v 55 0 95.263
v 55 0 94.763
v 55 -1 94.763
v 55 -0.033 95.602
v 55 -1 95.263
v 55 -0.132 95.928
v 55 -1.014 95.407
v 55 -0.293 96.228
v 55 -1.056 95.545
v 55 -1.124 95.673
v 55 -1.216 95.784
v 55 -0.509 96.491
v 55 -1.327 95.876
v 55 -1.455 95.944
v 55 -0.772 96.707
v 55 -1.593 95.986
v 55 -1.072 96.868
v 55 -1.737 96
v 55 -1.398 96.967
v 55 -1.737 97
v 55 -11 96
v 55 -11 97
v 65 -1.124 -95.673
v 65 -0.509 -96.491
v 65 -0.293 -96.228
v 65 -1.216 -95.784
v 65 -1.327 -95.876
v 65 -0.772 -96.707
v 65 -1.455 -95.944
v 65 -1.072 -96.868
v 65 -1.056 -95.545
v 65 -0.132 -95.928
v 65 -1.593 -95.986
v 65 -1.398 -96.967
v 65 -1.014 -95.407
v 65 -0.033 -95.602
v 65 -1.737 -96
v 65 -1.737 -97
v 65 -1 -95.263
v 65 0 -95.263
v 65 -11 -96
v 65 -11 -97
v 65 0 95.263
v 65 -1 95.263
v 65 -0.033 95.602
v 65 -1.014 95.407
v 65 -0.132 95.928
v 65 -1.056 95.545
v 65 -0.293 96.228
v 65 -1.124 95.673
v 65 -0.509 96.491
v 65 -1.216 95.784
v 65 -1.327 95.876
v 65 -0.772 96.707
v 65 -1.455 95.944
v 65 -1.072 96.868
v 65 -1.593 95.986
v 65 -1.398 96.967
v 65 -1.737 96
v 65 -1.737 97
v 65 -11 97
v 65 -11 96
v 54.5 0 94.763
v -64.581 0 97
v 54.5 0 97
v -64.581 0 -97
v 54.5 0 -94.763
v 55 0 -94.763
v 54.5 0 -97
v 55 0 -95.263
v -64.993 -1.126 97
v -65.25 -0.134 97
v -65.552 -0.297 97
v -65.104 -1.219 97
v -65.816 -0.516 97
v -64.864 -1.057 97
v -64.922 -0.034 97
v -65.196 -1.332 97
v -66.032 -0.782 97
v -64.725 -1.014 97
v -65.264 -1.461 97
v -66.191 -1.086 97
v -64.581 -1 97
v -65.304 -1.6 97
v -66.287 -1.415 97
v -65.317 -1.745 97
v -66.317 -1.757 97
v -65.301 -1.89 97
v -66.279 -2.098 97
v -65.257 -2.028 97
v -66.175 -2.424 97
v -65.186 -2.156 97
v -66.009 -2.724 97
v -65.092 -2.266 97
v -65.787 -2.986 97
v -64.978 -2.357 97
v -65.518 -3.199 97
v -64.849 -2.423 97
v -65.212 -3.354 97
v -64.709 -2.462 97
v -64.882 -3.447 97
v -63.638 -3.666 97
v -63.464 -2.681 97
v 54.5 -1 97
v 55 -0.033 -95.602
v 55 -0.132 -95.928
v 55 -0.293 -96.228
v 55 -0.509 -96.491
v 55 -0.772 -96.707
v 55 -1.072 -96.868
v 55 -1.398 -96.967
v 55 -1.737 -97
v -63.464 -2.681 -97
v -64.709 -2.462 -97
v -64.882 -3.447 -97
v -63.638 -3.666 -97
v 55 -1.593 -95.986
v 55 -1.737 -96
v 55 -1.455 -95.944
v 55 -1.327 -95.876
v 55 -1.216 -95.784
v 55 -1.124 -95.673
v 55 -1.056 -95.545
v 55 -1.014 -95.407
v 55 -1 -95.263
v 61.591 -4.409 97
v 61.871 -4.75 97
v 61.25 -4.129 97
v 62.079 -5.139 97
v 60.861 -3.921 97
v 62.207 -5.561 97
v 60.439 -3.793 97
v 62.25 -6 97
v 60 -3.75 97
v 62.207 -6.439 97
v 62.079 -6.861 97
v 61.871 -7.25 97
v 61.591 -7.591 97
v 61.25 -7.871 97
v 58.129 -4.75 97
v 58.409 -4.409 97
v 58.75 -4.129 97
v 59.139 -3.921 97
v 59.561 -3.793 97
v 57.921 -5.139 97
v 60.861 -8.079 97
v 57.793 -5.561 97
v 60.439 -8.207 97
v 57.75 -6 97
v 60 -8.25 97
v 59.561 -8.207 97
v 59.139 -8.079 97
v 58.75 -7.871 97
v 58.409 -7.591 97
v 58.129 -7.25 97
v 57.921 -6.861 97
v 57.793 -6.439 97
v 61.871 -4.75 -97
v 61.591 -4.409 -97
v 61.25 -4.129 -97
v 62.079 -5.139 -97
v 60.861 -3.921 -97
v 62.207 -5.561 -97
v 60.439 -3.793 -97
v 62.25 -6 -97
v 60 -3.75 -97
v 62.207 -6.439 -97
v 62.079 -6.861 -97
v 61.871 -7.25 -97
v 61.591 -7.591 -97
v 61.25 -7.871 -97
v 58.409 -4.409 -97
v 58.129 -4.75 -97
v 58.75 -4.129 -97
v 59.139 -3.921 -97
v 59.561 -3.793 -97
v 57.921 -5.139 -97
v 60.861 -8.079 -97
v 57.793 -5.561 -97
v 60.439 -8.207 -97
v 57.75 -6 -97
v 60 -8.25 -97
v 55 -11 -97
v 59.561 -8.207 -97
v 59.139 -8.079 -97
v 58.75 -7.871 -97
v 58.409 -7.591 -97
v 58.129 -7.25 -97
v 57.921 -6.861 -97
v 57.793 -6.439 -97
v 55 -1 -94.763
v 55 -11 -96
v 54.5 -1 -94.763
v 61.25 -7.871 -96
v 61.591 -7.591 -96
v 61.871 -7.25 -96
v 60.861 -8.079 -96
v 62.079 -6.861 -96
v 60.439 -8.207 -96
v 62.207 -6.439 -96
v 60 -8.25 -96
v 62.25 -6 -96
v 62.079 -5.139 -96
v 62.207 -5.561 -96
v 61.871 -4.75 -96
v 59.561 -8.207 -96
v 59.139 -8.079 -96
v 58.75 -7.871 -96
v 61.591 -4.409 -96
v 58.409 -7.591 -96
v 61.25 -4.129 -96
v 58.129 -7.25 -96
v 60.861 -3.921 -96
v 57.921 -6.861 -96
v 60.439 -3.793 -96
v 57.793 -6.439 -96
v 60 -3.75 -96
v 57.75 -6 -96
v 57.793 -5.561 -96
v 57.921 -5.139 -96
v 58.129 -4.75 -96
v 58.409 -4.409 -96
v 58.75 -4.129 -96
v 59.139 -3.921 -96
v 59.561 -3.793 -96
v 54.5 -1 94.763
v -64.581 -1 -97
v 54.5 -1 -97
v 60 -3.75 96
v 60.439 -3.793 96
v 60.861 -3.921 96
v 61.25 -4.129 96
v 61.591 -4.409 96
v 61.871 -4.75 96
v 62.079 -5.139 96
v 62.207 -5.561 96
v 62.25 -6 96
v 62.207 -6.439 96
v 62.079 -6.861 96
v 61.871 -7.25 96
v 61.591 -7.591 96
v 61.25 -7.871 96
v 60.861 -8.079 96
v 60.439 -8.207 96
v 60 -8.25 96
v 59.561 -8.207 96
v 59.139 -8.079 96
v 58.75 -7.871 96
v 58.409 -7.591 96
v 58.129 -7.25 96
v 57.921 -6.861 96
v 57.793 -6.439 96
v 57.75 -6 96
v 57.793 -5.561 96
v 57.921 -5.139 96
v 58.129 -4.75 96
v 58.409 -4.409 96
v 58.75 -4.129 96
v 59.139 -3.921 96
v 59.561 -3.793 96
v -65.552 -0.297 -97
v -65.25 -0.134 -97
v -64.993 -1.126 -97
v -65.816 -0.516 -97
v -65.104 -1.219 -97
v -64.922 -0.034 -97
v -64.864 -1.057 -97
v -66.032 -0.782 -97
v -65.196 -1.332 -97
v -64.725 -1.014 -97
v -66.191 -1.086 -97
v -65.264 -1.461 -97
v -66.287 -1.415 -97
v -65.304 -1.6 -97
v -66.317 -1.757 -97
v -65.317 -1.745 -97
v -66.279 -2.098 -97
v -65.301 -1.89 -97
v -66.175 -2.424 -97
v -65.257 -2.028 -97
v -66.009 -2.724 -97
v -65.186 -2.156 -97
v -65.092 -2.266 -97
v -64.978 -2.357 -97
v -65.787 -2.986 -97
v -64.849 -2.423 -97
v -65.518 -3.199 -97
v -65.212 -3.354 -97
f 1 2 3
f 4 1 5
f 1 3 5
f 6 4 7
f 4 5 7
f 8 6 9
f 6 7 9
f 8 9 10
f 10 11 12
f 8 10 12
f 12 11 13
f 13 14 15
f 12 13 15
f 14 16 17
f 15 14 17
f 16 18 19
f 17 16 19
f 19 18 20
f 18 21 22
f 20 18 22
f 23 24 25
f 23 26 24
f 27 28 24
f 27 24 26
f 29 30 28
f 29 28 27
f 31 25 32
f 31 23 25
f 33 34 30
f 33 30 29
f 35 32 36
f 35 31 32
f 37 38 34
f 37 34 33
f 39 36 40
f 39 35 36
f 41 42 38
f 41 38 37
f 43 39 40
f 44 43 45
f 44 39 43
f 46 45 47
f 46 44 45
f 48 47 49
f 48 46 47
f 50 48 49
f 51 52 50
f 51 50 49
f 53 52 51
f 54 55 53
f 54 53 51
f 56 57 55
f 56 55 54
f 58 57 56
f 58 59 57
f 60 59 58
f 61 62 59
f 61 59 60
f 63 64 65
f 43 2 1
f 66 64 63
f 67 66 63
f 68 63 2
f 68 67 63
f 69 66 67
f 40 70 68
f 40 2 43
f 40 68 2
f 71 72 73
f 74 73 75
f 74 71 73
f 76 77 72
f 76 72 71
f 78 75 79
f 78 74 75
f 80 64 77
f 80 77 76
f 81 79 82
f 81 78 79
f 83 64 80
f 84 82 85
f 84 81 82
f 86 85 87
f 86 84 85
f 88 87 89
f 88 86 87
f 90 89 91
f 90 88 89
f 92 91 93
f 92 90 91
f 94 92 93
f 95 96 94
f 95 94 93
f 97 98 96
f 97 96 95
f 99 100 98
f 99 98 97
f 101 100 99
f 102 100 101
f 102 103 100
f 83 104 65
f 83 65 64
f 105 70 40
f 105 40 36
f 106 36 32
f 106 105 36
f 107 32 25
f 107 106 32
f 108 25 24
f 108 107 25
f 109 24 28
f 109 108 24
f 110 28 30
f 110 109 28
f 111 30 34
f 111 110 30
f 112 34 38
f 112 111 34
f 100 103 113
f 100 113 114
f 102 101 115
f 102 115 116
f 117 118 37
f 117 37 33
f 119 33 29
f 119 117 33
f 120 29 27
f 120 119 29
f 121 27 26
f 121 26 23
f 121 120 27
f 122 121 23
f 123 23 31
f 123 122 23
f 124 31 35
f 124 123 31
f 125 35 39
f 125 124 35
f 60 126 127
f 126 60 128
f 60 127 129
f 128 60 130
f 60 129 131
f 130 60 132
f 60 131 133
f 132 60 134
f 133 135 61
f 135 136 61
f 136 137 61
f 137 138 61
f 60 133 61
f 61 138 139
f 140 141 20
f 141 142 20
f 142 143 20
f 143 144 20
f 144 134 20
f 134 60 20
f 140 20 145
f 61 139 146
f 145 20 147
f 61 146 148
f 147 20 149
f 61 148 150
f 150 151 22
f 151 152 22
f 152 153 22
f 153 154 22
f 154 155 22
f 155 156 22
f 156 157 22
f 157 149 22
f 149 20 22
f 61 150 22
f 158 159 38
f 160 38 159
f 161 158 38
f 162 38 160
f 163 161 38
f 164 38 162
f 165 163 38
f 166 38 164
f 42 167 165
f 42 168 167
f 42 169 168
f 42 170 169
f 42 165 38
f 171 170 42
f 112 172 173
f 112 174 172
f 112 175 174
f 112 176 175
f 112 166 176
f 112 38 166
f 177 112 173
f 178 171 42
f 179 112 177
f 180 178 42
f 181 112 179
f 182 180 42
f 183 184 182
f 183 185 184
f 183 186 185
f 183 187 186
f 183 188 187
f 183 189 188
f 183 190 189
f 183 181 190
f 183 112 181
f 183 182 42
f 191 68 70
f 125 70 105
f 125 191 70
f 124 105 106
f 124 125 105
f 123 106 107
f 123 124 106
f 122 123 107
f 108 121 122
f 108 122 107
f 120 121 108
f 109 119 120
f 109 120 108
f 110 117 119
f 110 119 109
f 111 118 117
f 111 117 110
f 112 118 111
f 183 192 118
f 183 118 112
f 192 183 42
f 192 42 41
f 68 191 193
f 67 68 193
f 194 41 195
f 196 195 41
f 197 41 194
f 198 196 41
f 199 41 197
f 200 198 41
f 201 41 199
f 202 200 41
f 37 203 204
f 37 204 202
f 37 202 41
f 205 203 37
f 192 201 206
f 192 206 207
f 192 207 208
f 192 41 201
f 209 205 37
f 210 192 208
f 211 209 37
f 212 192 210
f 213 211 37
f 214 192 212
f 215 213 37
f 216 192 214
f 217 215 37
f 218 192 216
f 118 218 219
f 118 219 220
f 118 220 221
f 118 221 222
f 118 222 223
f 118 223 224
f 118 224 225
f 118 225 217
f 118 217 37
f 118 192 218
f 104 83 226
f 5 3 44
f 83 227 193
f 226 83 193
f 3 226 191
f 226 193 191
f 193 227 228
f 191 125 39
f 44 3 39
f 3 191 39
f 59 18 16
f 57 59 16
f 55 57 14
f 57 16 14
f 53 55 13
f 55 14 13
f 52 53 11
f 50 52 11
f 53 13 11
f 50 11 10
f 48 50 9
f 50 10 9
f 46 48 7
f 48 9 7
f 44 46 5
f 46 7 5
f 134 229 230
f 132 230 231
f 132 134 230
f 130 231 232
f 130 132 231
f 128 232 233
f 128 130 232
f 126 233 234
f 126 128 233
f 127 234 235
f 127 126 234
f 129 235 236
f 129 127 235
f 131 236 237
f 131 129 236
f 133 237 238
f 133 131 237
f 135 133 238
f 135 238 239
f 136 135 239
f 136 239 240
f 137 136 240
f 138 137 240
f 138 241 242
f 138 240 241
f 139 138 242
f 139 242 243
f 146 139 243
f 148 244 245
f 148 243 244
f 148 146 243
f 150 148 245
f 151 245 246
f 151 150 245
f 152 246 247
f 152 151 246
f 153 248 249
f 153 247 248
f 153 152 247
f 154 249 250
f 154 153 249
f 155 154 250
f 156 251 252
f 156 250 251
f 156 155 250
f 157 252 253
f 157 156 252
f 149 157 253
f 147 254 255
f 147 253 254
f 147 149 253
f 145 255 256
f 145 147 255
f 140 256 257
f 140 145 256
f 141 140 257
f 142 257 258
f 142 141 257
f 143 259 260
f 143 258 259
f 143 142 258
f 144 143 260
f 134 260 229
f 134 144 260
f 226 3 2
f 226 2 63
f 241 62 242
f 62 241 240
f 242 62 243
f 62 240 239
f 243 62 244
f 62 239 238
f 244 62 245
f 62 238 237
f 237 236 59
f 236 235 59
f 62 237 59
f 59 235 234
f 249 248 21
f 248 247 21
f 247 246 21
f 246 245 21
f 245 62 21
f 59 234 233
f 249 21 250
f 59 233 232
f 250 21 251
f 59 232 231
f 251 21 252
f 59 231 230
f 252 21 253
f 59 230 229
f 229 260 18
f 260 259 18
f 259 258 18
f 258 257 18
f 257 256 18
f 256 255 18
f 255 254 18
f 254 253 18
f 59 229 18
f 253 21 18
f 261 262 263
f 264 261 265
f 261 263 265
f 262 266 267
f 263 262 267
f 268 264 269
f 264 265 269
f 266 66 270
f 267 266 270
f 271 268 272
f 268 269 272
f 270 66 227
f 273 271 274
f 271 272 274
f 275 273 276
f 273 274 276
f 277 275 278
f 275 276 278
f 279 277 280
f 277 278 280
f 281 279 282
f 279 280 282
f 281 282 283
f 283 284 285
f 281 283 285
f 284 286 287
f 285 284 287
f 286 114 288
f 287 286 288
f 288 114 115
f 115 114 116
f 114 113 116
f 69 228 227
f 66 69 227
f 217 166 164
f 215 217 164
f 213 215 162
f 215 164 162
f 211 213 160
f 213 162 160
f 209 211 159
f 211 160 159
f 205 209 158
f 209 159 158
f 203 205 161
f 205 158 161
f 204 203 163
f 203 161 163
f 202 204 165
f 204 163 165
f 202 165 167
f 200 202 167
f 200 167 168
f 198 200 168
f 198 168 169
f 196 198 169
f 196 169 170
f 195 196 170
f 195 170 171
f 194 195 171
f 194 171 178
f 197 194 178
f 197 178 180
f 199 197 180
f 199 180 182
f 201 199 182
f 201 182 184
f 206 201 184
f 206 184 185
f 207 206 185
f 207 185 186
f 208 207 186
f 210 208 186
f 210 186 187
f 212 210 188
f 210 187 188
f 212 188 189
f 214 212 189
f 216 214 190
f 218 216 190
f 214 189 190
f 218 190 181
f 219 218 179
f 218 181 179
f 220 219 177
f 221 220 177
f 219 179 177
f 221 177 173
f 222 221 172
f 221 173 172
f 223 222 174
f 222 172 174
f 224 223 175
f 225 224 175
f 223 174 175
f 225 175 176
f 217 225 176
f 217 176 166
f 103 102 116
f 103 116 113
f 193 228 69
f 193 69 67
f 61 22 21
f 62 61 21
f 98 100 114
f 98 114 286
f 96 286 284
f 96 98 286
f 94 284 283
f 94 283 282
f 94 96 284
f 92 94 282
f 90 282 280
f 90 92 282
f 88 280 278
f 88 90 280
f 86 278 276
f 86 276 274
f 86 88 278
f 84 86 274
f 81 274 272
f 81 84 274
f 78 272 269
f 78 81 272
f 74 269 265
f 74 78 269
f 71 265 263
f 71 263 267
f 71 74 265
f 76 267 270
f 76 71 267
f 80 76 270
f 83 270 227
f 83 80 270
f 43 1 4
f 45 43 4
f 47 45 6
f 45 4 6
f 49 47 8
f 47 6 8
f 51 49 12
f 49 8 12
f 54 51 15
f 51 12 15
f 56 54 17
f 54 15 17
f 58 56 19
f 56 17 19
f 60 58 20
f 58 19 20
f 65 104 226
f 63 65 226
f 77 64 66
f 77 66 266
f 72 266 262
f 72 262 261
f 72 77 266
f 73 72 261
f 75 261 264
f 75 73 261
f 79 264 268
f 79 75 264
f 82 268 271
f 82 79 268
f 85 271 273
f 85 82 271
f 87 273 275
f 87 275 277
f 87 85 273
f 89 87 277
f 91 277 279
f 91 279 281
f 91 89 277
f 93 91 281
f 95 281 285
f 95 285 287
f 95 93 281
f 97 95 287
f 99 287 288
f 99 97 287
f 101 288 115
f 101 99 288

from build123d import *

# Parameters (mm, degrees)
SKETCH1_W                     = 130
SKETCH1_H                     = 194
BASE_FLANGE1_DEPTH            = 1
EDGE_FLANGE1_STRIP_CUT_DEPTH  = 194
EDGE_FLANGE1_DEPTH            = 194
EDGE_FLANGE2_STRIP_W          = 5.4732
EDGE_FLANGE2_STRIP_H          = 1
EDGE_FLANGE2_STRIP_CUT_DEPTH  = 10
EDGE_FLANGE2_RELIEF_W         = 5.9732
EDGE_FLANGE2_RELIEF_H         = 0.5
EDGE_FLANGE2_RELIEF_CUT_DEPTH = 1
EDGE_FLANGE2_DEPTH            = 10
SKETCH14_R                    = 2.25
CUT_EXTRUDE1_DEPTH            = 206.316765339


# Sheet-metal steps are written as plain solids
with BuildPart() as part:
    # Sketch1 → Base-Flange1 (new body)
    with BuildSketch(Plane(origin=(0, 0, 0), x_dir=(1, 0, 0), z_dir=(0, 1, 0))):
        Rectangle(SKETCH1_W, SKETCH1_H)
    extrude(amount=-BASE_FLANGE1_DEPTH)

    # Edge-Flange1 strip (across the edge) → Edge-Flange1 strip cut (cut)
    with BuildSketch(Plane(origin=(-73, -1, 97), x_dir=(0.17364817766693103, 0.984807753012208, 0), z_dir=(0, 0, -1))):
        Polygon((-9.805618071, -61.369193981), (2.446817144, 8.117819101), (1.462009391, 8.291467279), (-10.790425824, -61.195545803), align=None)
    extrude(amount=EDGE_FLANGE1_STRIP_CUT_DEPTH, mode=Mode.SUBTRACT)

    # Edge-Flange1 section (across the edge) → Edge-Flange1 (add)
    with BuildSketch(Plane(origin=(-73, -1, 97), x_dir=(0.17364817766693103, 0.984807753012208, 0), z_dir=(0, 0, -1))):
        with BuildLine():
            Line((-1, 8.419376526), (-1, 9.682776526))
            Line((-1, 9.682776526), (0, 9.682776526))
            Line((0, 9.682776526), (0, 8.419376526))
            ThreePointArc((0, 8.419376526), (0.67240108, 7.685579512), (1.462009391, 8.291467279))
            Line((1.462009391, 8.291467279), (2.446817144, 8.117819101))
            ThreePointArc((2.446817144, 8.117819101), (0.585245337, 6.689384814), (-1, 8.419376526))
        make_face()
    extrude(amount=EDGE_FLANGE1_DEPTH)

    # Edge-Flange2 strip (across the edge) → Edge-Flange2 strip cut (cut)
    with BuildSketch(Plane(origin=(55, -1, -97), x_dir=(0, 0, 1), z_dir=(1, 0, 0))):
        with Locations((-1, -0.5)):
            Rectangle(EDGE_FLANGE2_STRIP_W, EDGE_FLANGE2_STRIP_H)
    edge_flange2_strip_cut = extrude(amount=EDGE_FLANGE2_STRIP_CUT_DEPTH, mode=Mode.SUBTRACT)

    # Edge-Flange2 relief (on the sheet) → Edge-Flange2 relief cut (cut)
    with BuildSketch(Plane(origin=(55, -1, -95.2634), x_dir=(0, 0, 1), z_dir=(0, -1, 0))):
        with Locations((-2.4866, 0.25)):
            Rectangle(EDGE_FLANGE2_RELIEF_W, EDGE_FLANGE2_RELIEF_H)
    edge_flange2_relief_cut = extrude(amount=-EDGE_FLANGE2_RELIEF_CUT_DEPTH, mode=Mode.SUBTRACT)

    # Edge-Flange2 section (across the edge) → Edge-Flange2 (add)
    with BuildSketch(Plane(origin=(55, -1, -97), x_dir=(0, 0, 1), z_dir=(1, 0, 0))):
        with BuildLine():
            Line((0, 0.7366), (0, 10))
            Line((0, 10), (1, 10))
            Line((1, 10), (1, 0.7366))
            ThreePointArc((1, 0.7366), (1.215745145, 0.215745145), (1.7366, 0))
            Line((1.7366, 0), (1.7366, -1))
            ThreePointArc((1.7366, -1), (0.508638364, -0.491361636), (0, 0.7366))
        make_face()
    edge_flange2 = extrude(amount=EDGE_FLANGE2_DEPTH)

    # Sketch14 → Cut-Extrude1 (cut, through all)
    with BuildSketch(Plane(origin=(0, 0, -97), x_dir=(-1, 0, 0), z_dir=(0, 0, -1))):
        with Locations(Location((-60, -6, 0), (0, 0, 90))):
            Circle(SKETCH14_R)
    cut_extrude1 = extrude(amount=-CUT_EXTRUDE1_DEPTH, mode=Mode.SUBTRACT)

    # Mirror1: Edge-Flange2 strip cut, Edge-Flange2 relief cut, Edge-Flange2, Cut-Extrude1 across plane
    add(edge_flange2_strip_cut.mirror(Plane.XY), mode=Mode.SUBTRACT)
    add(edge_flange2_relief_cut.mirror(Plane.XY), mode=Mode.SUBTRACT)
    add(edge_flange2.mirror(Plane.XY))
    add(cut_extrude1.mirror(Plane.XY), mode=Mode.SUBTRACT)


solid = part.part
